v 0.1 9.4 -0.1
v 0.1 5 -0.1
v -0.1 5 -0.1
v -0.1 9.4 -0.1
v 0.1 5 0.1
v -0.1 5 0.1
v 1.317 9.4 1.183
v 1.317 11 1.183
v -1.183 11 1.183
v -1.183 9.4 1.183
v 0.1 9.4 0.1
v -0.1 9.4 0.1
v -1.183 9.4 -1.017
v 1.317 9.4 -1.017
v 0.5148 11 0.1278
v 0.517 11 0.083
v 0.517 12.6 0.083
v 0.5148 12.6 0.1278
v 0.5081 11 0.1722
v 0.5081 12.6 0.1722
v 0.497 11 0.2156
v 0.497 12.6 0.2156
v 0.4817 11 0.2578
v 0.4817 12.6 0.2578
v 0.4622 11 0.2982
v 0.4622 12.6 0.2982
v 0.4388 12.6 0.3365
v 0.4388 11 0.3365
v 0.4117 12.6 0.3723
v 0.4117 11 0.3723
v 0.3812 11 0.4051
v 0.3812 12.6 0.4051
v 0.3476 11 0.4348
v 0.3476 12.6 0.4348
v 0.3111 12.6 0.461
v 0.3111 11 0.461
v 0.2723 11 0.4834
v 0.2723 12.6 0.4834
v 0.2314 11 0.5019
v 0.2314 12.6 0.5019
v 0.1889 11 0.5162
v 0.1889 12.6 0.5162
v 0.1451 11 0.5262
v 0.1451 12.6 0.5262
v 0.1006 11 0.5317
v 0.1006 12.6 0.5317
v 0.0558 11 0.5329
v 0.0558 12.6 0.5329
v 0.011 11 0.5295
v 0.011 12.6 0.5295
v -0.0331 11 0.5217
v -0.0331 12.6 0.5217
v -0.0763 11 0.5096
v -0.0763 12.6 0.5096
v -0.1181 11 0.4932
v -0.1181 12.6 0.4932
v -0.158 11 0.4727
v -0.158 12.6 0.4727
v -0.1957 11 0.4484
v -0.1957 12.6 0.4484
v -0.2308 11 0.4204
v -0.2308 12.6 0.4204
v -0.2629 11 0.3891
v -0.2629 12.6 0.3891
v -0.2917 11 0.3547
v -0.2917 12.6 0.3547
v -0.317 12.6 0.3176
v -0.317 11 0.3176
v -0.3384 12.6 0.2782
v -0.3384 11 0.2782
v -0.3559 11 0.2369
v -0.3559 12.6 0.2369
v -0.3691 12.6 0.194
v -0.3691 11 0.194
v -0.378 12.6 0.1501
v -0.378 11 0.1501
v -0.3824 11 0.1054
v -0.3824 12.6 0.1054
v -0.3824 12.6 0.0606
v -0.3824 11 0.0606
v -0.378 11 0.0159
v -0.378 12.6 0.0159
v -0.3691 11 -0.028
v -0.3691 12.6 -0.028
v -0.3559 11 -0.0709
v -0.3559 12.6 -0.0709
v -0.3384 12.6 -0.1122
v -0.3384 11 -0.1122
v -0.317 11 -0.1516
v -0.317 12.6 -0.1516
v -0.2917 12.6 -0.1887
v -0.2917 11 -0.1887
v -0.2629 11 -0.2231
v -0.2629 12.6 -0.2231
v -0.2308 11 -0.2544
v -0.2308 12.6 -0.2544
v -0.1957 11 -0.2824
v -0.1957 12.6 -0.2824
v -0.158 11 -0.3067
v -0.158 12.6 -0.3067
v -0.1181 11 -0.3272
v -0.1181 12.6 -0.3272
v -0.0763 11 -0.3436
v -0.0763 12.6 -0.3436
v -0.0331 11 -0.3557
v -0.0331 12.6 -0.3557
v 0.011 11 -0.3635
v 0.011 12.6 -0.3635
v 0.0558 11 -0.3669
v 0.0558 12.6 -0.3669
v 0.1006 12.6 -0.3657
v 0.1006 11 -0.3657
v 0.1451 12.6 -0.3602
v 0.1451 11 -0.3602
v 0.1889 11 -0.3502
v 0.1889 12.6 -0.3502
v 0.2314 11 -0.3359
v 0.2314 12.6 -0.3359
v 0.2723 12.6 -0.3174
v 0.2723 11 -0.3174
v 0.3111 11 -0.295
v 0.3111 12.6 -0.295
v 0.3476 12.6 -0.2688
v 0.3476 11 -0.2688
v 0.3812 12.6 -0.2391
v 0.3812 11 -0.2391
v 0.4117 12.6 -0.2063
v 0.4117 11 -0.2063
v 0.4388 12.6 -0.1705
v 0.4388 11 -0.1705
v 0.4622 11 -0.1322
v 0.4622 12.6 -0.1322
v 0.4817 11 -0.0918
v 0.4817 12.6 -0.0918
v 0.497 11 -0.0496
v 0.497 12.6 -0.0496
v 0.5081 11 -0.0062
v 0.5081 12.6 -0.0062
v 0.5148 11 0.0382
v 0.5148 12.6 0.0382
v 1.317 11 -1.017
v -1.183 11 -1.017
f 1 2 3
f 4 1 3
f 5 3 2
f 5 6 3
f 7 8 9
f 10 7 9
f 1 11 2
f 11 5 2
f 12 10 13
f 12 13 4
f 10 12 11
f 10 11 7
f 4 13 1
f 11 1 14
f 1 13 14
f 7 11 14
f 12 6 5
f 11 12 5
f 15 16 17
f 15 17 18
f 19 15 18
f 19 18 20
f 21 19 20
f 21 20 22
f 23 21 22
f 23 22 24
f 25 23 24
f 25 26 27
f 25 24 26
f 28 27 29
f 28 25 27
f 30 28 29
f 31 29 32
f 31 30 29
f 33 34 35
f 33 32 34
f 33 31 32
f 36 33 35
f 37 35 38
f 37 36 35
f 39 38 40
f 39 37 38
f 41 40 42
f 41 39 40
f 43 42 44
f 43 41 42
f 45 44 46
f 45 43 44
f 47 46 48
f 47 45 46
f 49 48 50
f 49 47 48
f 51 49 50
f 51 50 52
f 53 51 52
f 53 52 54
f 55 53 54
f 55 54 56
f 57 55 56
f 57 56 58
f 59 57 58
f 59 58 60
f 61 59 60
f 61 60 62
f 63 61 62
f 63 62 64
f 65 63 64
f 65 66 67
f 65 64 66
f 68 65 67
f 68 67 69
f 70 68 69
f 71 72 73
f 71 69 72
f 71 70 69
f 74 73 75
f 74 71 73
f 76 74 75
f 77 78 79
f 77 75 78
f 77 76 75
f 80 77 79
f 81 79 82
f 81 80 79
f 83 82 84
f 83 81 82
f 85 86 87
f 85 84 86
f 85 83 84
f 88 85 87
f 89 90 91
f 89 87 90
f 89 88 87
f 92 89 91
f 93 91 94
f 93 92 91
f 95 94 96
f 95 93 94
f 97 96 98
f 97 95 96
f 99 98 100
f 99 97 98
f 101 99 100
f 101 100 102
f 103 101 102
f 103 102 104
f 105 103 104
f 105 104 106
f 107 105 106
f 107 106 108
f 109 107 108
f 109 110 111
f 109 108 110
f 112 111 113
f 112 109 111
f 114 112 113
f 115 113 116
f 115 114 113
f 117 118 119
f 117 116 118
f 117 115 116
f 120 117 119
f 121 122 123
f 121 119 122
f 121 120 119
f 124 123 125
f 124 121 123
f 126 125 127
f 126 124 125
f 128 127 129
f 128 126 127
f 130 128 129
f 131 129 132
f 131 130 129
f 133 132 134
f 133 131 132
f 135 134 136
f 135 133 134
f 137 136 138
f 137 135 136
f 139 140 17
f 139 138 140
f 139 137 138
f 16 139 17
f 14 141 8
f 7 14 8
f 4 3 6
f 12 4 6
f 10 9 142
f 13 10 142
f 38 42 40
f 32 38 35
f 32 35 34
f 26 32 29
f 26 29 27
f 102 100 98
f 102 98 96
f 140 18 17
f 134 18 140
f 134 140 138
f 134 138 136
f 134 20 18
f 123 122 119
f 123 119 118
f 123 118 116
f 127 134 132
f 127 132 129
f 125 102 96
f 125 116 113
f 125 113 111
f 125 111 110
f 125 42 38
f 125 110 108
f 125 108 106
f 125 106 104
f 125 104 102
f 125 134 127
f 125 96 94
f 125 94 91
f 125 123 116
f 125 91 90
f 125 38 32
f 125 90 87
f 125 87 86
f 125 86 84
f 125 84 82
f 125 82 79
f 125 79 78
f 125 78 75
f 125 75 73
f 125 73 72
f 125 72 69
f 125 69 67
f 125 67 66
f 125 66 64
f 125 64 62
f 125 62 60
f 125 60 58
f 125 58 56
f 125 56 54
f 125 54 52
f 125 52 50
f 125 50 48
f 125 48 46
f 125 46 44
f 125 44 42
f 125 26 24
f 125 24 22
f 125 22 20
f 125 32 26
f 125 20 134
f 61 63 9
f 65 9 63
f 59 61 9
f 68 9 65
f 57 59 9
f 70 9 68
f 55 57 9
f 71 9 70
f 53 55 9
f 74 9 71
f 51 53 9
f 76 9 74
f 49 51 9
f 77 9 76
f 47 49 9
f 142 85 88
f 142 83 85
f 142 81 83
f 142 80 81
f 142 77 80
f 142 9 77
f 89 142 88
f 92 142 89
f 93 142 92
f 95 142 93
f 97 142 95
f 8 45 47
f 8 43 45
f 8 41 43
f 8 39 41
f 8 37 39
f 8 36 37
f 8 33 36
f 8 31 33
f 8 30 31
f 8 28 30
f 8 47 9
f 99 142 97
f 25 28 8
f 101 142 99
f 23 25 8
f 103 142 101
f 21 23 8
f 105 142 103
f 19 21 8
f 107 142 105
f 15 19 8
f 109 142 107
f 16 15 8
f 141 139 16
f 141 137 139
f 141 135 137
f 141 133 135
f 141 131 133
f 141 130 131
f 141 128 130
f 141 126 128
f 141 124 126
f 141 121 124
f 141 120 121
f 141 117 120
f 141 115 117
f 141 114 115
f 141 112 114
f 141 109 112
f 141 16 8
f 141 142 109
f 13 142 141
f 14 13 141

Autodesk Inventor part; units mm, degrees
ref_plane "YZ Plane" through (0, 0, 0) normal (1, 0, 0) x (0, 1, 0)
ref_plane "XZ Plane" through (0, 0, 0) normal (0, 1, 0) x (-1, 0, 0)
ref_plane "XY Plane" through (0, 0, 0) normal (0, 0, 1) x (1, 0, 0)
sketch "Boceto1" plane through (0, 0, 0) normal (0, 1, 0) x (-1, 0, 0)
  line L0 (0.1, 0.1) -> (-0.1, 0.1)
  line L1 (-0.1, 0.1) -> (-0.1, -0.1)
  line L2 (-0.1, -0.1) -> (0.1, -0.1)
  line L3 (0.1, -0.1) -> (0.1, 0.1)
  point P0 (0, 0)
  dimension "L" = 0.2
  dimension "d1" = 0.2
  dimension "d2" = 0.1
  dimension "d3" = 0.1
extrude "Extrusión1" add sketch "Boceto1" along normal blind 11
sketch "Boceto2" plane through (0, 11, 0) normal (0, 1, 0) x (1, 0, 0)
  line L0 (-1.183, 1.017) -> (1.317, 1.017)
  line L1 (1.317, 1.017) -> (1.317, -1.183)
  line L2 (1.317, -1.183) -> (-1.183, -1.183)
  line L3 (-1.183, -1.183) -> (-1.183, 1.017)
  point P0 (0, 0)
  dimension "d6" = 2.2
  dimension "d7" = 2.5
extrude "Extrusión2" add sketch "Boceto2" against normal blind 1.6
ref_plane "Plano de trabajo1" through (0.067, 11, 1.183) normal (1, 0, 0) x (0, 0, -1)
ref_plane "Plano de trabajo2" through (-1.183, 11, 0.083) normal (0, 0, 1) x (1, 0, 0)
ref_plane "Plano de trabajo3" through (-1.183, 11, 0.083) normal (0, 0, 1) x (1, 0, 0)
ref_plane "Plano de trabajo4" through (0, 11, 0) normal (0, 1, 0) x (1, 0, 0)
sketch "Boceto3" plane through (0, 11, 0) normal (0, 1, 0) x (1, 0, 0)
  circle A0 centre (0.067, -0.083) radius 0.45
  line L0 (1.317, -1.183) -> (1.317, 1.017) projected
  line L1 (1.317, 1.017) -> (-1.183, 1.017) projected
  line L2 (-1.183, 1.017) -> (-1.183, -1.183) projected
  line L3 (-1.183, -1.183) -> (1.317, -1.183) projected
  point P0 (0, 0)
  dimension "d11" = 0.9
  dimension "d12" = 1.1
  dimension "d13" = 1.25
extrude "Extrusión3" add sketch "Boceto3" along normal blind 1.6 contours A0
sketch "Boceto4" plane through (0, 0, 0) normal (0, -1, 0) x (1, 0, 0)
  line L0 (0.1, 0.1) -> (0.1, -0.1) projected
  line L1 (-0.1, 0.1) -> (0.1, 0.1) projected
  line L2 (-0.1, -0.1) -> (-0.1, 0.1) projected
  line L3 (0.1, -0.1) -> (-0.1, -0.1) projected
  line L4 (0.1, -0.1) -> (0.1, 0.1) projected
  line L5 (0.1, 0.1) -> (-0.1, 0.1)
  line L6 (-0.1, 0.1) -> (-0.1, -0.1)
  line L7 (-0.1, -0.1) -> (0.1, -0.1)
  line L8 (0.1, -0.1) -> (0.1, 0.1)
  point P0 (0, 0)
extrude "Extrusión4" cut sketch "Boceto4" against normal blind 5
equation "\"d1\" = L"
equation "\"d2\" = 0.5 * L"
equation "\"d3\" = 0.5 * L"
properties part number "pata"
